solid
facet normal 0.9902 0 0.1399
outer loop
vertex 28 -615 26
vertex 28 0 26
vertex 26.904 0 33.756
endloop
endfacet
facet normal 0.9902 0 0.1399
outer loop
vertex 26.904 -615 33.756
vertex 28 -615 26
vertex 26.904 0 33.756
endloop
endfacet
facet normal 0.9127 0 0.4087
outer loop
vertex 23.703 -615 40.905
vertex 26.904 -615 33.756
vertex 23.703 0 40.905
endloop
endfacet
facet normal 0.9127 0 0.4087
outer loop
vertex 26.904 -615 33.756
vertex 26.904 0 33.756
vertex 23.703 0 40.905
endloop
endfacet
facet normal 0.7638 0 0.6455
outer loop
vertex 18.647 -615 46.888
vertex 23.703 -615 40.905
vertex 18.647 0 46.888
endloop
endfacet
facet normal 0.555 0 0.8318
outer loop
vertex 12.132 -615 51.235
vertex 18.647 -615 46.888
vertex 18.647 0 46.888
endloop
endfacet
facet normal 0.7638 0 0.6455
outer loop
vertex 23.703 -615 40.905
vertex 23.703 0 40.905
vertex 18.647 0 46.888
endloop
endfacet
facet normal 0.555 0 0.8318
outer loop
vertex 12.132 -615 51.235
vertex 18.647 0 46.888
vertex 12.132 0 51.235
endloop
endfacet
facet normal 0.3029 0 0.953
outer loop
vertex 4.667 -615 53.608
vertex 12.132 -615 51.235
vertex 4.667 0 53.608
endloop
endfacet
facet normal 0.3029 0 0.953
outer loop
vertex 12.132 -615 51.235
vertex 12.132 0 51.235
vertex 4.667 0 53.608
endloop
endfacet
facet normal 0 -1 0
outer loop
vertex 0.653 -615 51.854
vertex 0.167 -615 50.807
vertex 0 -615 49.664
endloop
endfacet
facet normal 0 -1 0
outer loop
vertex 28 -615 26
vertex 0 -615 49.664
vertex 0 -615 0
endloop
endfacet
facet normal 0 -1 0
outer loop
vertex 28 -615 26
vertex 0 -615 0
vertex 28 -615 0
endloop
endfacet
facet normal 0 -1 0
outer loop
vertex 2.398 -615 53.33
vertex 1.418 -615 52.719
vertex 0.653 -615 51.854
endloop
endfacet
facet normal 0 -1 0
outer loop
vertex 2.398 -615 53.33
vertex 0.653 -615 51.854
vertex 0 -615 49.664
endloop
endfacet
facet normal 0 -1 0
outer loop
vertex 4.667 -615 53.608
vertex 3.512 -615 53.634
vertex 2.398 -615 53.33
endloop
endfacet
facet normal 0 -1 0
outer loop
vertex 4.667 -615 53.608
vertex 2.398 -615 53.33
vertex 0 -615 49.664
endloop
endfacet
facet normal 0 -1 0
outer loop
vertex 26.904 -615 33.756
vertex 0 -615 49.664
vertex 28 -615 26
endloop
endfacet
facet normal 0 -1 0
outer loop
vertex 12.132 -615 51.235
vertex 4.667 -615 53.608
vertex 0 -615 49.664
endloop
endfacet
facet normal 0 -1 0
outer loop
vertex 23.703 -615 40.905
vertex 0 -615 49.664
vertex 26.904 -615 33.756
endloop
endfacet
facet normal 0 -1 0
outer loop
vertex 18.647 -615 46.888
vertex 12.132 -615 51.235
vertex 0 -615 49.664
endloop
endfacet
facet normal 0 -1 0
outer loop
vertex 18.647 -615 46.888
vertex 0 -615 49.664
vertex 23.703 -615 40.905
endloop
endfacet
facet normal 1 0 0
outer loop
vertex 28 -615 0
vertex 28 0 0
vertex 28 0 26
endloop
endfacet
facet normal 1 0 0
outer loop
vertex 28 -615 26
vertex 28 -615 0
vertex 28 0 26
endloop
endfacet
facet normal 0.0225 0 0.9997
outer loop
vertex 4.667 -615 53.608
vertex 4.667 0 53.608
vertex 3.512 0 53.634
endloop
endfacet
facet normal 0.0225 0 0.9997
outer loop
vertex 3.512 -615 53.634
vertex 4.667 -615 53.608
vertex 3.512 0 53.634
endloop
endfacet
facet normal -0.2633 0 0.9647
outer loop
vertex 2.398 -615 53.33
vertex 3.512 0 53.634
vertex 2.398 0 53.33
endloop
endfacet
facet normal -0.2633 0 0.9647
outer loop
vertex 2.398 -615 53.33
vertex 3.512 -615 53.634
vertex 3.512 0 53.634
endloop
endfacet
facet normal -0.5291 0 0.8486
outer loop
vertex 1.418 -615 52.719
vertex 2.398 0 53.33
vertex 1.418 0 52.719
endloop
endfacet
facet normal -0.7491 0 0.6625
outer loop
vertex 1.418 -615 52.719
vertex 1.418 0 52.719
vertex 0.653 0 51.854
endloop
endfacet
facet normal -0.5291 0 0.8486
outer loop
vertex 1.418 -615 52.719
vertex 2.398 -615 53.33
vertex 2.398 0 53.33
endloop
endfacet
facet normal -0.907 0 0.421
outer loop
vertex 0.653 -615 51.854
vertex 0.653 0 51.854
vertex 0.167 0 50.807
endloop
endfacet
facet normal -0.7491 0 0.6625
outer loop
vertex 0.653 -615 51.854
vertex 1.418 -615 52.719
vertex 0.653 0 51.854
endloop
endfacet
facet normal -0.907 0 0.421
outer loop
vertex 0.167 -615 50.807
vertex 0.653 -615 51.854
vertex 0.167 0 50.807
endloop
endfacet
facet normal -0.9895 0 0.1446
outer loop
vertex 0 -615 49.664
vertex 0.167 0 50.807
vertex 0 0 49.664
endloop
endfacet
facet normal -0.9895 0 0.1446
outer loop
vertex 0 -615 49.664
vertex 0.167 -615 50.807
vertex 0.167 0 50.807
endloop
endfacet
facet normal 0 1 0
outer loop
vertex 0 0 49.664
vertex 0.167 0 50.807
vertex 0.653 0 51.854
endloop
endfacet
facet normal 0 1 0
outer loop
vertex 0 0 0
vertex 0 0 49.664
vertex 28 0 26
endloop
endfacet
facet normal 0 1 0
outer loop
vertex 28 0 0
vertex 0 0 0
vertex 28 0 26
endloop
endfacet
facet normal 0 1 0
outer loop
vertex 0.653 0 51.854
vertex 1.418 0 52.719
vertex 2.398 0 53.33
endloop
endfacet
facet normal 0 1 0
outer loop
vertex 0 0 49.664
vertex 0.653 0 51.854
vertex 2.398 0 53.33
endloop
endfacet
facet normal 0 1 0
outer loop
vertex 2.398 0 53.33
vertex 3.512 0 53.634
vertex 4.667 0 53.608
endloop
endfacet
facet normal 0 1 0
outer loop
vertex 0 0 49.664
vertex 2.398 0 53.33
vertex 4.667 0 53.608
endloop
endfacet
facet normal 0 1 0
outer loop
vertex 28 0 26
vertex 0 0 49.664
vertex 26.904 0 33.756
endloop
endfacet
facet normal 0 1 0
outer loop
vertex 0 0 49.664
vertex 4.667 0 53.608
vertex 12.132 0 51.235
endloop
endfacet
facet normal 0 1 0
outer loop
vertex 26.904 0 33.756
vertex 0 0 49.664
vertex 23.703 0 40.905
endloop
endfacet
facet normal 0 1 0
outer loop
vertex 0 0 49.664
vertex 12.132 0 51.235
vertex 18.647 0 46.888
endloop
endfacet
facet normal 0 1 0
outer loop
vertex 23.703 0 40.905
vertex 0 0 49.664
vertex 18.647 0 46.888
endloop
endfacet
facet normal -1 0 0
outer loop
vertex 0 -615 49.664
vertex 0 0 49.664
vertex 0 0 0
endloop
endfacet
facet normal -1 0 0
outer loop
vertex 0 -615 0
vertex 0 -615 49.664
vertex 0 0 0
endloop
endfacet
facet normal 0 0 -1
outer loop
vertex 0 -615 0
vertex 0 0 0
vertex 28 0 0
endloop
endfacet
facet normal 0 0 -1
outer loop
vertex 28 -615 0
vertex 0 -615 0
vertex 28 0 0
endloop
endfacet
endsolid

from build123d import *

# Parameters (mm, degrees)
PAD_DEPTH = 615
FILLET_R  = 4


with BuildPart() as part:
    # Sketch → Pad (new body)
    with BuildSketch(Plane.XZ):
        with BuildLine():
            Line((0, 0), (28, 0))
            Line((28, 0), (28, 26))
            ThreePointArc((28, 26), (19.79899, 45.79899), (0, 54))
            Line((0, 54), (0, 0))
        make_face()
    extrude(amount=PAD_DEPTH)

    # Fillet
    fillet_edges = [part.edges().sort_by_distance(p)[0] for p in [
        (0, -307.5, 54),
    ]]
    fillet(fillet_edges, radius=FILLET_R)


solid = part.part
